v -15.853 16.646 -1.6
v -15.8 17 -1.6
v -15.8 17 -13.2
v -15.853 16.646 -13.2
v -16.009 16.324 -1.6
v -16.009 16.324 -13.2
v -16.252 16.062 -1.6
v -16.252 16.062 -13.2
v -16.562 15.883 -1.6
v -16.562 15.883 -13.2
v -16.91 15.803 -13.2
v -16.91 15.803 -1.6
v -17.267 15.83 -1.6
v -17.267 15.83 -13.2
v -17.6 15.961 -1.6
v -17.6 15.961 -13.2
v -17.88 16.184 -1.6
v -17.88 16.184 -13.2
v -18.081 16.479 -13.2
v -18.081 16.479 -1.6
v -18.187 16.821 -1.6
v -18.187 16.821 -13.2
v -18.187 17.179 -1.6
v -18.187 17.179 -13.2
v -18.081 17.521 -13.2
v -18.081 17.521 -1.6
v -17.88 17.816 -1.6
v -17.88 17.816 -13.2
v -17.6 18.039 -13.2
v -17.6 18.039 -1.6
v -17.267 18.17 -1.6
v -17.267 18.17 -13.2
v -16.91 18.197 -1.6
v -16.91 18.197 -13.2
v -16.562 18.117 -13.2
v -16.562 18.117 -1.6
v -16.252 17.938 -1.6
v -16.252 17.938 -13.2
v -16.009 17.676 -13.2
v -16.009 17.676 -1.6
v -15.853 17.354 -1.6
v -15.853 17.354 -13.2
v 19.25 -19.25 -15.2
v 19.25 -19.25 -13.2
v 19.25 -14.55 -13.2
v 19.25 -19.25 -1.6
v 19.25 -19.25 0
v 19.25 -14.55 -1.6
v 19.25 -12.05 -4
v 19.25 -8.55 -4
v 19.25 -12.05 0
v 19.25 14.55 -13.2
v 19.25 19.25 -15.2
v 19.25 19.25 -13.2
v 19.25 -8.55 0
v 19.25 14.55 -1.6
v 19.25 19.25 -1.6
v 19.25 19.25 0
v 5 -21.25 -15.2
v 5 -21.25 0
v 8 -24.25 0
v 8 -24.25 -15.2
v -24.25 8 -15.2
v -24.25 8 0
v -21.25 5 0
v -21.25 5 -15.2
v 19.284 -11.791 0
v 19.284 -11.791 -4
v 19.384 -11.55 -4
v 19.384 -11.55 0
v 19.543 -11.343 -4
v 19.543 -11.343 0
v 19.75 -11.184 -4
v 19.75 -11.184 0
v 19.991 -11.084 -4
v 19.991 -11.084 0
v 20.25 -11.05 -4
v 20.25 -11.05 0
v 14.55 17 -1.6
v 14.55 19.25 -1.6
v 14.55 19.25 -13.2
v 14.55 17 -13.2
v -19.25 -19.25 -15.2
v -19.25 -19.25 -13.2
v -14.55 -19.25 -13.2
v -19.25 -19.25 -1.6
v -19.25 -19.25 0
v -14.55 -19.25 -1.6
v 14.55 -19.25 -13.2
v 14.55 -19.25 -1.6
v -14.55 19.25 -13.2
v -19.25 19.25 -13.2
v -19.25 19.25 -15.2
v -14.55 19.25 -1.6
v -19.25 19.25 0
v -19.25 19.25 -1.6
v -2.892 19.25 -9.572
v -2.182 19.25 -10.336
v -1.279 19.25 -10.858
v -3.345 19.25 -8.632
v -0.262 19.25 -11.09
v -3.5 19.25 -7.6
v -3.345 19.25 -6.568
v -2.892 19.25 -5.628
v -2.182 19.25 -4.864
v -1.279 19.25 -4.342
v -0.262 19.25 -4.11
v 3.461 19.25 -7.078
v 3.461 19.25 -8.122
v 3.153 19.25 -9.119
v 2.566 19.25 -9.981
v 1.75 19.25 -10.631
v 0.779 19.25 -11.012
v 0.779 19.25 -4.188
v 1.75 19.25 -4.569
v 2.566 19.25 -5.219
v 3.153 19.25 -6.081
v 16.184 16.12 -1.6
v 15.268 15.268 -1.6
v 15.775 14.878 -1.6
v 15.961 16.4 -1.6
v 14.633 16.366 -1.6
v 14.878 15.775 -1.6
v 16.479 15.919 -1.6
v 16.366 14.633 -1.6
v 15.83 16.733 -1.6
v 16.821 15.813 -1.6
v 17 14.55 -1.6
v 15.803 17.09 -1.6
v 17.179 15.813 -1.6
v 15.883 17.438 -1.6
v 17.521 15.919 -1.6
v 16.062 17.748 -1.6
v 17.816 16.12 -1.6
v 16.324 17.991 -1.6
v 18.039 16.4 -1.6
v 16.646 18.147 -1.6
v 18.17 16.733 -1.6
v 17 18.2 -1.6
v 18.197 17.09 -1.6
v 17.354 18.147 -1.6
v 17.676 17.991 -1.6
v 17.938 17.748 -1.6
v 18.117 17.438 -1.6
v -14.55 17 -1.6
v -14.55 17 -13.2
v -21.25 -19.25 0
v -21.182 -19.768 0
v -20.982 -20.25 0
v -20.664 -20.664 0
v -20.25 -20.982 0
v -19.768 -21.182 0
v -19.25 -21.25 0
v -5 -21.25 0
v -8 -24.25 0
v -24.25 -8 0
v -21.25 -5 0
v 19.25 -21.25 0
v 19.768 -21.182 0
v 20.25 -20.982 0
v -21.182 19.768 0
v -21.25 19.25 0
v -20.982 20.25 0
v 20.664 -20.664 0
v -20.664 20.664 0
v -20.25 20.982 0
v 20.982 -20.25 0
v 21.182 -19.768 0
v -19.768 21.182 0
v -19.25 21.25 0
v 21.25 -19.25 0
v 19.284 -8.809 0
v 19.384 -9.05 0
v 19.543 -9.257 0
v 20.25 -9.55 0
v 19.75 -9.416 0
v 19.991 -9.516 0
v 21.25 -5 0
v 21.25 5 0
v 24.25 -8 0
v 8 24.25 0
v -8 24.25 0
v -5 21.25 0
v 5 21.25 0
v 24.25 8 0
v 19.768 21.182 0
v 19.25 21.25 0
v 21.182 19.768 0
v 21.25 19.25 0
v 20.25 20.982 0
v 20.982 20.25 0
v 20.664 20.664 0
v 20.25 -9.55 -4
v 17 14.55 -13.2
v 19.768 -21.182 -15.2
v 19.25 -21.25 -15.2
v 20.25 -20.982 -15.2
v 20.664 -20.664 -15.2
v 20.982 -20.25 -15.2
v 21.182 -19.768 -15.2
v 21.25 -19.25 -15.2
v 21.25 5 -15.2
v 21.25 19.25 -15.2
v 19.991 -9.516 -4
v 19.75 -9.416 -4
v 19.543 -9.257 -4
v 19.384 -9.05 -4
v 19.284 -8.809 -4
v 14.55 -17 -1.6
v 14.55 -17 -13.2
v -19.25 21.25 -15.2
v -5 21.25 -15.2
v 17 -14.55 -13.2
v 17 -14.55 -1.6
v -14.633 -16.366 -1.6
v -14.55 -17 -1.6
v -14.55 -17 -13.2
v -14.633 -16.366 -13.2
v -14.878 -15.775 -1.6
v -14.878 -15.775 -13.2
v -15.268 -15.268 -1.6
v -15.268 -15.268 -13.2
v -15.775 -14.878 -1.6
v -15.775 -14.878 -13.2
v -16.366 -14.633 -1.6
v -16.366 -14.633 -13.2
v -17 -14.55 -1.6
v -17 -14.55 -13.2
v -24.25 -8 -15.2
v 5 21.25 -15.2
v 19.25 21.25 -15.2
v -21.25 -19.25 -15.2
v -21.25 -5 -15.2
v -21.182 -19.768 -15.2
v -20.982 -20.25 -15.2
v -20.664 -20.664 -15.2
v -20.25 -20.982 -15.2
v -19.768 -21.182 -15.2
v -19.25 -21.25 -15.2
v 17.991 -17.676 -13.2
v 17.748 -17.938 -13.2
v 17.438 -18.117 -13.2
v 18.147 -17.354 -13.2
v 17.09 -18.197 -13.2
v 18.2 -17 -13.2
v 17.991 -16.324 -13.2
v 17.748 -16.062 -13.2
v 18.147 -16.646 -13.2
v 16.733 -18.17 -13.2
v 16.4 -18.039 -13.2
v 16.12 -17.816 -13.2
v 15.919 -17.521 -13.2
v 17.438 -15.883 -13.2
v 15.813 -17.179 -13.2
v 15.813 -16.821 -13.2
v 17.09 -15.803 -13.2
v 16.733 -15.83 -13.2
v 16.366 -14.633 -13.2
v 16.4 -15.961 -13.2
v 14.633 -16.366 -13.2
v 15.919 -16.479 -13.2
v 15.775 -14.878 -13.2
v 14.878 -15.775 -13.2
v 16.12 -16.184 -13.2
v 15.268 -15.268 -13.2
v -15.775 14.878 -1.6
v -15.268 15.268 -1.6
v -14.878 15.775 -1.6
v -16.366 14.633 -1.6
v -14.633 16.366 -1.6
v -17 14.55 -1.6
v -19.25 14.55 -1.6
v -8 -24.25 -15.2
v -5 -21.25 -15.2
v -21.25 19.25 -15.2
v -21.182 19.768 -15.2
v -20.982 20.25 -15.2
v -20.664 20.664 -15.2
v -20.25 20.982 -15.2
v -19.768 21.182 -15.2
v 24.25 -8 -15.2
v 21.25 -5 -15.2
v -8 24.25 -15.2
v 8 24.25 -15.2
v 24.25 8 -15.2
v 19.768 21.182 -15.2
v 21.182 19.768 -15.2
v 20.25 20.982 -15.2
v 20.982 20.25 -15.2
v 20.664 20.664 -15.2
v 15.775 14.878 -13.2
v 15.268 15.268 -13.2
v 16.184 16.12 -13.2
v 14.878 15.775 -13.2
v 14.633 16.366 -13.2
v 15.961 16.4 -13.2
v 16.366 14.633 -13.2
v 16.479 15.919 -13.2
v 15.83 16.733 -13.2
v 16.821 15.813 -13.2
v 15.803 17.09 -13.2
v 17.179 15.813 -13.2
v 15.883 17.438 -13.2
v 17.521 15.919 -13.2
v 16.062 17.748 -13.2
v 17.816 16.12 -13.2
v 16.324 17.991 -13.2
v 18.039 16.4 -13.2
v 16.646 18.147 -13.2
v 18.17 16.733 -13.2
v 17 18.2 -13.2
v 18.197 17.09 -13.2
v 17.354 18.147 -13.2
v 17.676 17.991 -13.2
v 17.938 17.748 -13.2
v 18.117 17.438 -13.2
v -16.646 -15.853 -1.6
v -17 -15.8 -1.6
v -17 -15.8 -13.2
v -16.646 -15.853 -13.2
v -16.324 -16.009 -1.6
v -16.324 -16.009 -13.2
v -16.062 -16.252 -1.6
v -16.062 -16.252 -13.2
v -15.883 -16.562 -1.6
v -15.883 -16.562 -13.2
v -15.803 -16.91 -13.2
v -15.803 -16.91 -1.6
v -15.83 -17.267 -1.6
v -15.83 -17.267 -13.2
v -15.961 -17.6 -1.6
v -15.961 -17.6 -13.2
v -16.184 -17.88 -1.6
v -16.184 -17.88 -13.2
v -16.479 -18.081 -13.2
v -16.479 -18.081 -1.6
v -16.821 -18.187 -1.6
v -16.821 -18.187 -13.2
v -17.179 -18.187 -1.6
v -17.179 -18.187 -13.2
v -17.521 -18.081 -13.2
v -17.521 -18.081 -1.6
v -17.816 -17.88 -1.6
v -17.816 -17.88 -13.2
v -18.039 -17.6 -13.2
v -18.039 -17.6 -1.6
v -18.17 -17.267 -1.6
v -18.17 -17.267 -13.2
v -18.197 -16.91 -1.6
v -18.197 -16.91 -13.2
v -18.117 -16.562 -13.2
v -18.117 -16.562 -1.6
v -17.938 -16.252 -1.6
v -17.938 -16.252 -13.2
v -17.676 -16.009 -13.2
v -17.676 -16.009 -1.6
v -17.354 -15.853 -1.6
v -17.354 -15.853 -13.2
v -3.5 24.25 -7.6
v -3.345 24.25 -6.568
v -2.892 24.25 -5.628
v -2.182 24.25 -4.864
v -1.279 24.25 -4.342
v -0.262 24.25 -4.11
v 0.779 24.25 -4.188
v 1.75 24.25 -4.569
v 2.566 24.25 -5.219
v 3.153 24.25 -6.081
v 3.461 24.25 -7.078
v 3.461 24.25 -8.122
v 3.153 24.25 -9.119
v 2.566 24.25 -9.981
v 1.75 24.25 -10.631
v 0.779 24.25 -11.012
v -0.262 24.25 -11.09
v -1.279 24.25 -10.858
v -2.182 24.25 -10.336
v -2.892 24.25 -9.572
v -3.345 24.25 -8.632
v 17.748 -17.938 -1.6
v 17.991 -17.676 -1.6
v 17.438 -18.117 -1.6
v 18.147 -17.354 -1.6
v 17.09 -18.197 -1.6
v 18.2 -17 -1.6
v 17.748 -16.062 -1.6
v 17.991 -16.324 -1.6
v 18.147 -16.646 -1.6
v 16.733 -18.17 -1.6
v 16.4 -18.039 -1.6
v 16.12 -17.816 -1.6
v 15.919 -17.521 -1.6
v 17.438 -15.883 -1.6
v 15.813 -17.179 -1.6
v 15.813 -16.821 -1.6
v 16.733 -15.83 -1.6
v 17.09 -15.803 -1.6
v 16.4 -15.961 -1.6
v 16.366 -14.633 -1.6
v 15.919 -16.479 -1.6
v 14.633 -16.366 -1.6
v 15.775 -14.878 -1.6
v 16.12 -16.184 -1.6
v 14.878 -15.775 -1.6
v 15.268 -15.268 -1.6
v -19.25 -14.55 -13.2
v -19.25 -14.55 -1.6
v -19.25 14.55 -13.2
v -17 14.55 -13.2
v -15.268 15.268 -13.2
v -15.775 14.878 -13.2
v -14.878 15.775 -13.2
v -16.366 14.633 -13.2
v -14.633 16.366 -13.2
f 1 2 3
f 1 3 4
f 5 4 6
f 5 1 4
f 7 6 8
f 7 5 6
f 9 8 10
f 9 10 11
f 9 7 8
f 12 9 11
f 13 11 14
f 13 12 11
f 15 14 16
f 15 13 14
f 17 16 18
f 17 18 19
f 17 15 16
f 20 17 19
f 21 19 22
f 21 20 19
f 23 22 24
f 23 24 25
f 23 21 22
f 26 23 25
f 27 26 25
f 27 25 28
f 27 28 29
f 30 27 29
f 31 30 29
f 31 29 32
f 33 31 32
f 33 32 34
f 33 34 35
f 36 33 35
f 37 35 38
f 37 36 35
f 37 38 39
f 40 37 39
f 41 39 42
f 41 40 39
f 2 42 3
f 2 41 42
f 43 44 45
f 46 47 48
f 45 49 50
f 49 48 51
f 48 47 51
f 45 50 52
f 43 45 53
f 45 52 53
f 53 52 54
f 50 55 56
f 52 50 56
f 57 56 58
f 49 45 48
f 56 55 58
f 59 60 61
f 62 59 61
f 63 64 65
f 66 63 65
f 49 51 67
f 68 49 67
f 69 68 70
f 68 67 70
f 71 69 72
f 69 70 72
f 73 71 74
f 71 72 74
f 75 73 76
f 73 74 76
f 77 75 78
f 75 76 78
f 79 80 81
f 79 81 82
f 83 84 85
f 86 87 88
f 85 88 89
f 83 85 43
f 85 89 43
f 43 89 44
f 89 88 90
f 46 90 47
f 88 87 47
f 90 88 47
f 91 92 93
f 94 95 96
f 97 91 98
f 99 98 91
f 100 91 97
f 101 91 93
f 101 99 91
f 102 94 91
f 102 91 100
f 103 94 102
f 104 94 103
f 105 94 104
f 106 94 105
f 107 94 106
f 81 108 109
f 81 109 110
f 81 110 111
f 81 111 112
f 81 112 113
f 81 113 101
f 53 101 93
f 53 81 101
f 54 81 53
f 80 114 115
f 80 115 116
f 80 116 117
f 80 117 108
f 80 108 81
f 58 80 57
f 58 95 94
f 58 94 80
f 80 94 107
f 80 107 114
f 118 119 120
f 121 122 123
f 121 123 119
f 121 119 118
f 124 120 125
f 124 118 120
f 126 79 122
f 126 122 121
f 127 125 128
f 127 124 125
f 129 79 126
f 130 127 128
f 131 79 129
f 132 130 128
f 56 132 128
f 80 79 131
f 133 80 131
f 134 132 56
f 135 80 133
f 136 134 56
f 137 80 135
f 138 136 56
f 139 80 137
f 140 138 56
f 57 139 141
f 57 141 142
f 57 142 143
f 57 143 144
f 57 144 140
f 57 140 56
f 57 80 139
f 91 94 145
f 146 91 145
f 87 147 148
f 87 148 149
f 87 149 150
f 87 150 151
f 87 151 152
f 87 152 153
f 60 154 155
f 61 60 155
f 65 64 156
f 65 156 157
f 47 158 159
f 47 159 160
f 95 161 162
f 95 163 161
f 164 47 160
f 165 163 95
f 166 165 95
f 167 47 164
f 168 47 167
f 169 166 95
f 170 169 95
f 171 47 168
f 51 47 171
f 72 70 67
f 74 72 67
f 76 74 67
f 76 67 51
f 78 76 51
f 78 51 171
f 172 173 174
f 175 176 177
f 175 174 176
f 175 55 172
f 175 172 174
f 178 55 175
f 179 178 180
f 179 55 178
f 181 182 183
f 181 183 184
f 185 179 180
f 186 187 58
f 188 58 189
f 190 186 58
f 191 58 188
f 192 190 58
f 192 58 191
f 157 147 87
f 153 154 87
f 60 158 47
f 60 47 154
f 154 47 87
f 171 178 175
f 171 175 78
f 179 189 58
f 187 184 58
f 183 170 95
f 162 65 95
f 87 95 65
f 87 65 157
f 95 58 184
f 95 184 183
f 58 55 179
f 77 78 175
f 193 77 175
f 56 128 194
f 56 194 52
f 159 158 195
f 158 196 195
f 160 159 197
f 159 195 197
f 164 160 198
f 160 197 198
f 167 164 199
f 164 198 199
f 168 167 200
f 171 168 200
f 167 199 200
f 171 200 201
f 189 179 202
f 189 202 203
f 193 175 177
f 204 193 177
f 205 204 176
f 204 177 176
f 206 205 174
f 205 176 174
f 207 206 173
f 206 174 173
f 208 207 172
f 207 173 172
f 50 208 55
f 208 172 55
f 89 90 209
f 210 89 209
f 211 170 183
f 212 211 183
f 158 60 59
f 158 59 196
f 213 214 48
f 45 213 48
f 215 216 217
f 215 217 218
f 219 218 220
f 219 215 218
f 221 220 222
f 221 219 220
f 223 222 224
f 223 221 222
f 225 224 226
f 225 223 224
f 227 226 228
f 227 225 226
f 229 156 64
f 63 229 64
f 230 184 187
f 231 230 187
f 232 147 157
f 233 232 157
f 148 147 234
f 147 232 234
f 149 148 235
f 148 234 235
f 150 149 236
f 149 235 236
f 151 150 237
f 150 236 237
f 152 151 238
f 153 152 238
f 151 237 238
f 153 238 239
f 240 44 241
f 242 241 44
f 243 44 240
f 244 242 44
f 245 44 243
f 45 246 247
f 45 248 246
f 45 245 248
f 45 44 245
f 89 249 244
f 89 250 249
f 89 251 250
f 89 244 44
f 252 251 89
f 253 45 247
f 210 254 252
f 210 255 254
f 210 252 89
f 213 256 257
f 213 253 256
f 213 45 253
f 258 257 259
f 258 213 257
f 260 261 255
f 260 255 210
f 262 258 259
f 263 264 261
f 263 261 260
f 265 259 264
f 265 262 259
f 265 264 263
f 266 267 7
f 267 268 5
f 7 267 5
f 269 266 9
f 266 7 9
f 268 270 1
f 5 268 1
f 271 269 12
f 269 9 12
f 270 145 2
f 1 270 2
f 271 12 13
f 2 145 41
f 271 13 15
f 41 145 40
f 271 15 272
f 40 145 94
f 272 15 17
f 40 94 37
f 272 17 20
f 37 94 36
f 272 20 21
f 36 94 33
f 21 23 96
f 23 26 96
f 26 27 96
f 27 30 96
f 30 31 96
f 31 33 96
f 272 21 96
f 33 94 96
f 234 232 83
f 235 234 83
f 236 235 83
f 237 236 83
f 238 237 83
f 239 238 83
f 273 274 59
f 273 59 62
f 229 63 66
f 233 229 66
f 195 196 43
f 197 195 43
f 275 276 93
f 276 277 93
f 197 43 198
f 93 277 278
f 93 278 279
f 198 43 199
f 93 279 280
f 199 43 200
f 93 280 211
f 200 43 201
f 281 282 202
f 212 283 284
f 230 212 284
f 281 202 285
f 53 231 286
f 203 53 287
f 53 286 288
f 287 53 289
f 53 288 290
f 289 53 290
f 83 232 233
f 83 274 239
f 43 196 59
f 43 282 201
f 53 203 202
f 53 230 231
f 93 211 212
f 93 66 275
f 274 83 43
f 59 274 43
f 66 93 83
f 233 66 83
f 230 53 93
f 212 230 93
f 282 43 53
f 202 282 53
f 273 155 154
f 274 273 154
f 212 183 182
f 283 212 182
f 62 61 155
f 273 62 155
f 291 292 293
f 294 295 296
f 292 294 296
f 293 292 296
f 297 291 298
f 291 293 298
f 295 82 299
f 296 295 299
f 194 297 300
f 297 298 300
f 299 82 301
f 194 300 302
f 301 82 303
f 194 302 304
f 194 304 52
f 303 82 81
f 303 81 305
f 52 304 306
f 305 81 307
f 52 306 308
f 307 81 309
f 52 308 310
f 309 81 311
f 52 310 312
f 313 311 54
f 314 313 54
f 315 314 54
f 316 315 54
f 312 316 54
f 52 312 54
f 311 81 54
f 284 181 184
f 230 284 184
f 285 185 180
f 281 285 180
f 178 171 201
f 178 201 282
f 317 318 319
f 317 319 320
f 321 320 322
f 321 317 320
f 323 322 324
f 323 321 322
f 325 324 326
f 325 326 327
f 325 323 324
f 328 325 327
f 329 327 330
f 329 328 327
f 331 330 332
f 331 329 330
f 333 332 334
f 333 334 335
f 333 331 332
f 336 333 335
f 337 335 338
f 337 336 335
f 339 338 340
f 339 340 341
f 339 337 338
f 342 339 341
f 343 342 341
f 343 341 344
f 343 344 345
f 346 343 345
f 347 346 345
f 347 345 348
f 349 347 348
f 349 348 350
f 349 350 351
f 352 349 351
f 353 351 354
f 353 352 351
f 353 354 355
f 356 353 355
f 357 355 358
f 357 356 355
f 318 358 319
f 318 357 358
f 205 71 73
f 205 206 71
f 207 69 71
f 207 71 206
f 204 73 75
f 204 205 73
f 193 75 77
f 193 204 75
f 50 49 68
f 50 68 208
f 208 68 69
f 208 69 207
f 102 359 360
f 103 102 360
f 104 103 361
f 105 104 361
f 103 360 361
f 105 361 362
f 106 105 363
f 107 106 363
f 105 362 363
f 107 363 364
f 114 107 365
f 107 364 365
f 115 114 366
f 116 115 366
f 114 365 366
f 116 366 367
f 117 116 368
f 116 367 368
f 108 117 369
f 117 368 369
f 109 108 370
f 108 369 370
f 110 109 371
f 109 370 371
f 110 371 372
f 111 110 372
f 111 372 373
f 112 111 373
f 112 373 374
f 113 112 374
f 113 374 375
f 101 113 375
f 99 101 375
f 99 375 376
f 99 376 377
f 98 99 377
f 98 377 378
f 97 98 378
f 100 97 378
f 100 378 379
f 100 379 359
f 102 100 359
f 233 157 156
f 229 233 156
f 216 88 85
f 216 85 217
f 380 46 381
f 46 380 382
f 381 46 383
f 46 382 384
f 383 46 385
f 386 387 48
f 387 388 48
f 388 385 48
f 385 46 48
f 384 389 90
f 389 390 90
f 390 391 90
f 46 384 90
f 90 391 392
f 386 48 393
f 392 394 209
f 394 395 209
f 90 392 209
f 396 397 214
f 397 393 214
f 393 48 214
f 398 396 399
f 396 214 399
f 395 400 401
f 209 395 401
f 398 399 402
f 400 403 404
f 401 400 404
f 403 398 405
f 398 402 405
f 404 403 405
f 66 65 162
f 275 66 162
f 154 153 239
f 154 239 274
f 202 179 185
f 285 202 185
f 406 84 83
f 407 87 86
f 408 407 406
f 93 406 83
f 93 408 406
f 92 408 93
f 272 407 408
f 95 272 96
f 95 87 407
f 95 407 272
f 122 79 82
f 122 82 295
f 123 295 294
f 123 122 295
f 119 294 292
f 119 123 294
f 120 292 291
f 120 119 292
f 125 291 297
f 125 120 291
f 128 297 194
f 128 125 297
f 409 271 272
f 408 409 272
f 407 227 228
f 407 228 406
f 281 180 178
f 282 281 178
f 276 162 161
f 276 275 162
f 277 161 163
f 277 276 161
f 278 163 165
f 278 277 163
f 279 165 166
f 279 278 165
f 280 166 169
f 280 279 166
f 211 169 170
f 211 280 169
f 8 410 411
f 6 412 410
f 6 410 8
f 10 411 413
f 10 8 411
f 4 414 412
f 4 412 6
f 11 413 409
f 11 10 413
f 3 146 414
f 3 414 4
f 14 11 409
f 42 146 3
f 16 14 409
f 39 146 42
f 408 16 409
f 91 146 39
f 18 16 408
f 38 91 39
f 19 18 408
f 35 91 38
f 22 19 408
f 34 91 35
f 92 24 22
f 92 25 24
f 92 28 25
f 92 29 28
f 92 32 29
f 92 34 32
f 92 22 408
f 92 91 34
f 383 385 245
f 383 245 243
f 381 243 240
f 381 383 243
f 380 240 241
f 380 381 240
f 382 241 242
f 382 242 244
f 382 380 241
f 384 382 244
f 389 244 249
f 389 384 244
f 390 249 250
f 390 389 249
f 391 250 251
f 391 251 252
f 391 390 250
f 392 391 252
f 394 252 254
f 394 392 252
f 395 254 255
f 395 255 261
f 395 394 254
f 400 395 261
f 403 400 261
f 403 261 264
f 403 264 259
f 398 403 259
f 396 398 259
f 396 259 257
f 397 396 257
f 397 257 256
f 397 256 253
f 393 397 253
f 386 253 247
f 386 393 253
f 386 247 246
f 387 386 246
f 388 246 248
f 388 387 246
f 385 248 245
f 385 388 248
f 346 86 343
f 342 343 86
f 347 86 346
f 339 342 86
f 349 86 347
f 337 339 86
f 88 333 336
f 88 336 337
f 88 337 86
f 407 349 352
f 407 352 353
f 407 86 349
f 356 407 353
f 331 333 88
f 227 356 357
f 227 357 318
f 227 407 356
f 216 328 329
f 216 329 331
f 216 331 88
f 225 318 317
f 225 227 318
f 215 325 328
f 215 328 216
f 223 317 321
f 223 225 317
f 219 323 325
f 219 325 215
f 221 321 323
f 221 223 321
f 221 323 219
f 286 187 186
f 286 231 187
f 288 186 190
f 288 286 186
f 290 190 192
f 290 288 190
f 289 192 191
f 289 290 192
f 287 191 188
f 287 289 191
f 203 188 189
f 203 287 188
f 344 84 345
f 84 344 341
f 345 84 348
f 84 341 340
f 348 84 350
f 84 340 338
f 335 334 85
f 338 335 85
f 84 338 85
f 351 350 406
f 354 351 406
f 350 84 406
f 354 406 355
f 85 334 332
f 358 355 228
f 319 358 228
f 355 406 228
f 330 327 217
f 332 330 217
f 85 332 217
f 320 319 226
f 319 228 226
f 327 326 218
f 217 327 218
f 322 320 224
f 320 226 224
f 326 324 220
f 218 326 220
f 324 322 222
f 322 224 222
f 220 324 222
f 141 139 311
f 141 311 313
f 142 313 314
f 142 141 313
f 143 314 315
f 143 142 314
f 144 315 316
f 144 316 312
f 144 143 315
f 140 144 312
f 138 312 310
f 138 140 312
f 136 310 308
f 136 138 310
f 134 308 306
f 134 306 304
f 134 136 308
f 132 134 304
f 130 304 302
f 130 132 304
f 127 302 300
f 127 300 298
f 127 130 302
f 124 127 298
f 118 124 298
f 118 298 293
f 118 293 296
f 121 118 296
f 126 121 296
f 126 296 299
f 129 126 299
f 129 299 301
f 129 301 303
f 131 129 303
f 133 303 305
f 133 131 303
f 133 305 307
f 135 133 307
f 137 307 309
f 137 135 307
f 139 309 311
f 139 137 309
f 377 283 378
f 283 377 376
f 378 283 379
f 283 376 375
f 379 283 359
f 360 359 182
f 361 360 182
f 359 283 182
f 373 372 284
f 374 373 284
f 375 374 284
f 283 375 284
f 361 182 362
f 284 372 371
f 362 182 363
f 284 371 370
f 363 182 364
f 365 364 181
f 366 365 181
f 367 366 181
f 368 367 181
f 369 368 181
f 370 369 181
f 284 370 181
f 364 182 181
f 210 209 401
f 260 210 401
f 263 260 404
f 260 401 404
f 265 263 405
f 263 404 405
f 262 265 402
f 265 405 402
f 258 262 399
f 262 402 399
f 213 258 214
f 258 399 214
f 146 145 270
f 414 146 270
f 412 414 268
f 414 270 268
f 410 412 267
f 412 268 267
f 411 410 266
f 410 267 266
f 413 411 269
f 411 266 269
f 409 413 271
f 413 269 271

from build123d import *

# Parameters (mm, degrees)
SKETCH1_W           = 42.5
SKETCH1_H           = 42.5
SKETCH1_W_2         = 38.5
SKETCH1_H_2         = 38.5
BOSS_EXTRUDE2_DEPTH = 15.2
SKETCH2_R           = 1.2
BOSS_EXTRUDE4_DEPTH = 11.6
BOSS_EXTRUDE5_DEPTH = 15.2
CIRPATTERN1_COUNT   = 4
CUT_EXTRUDE2_DEPTH  = 4
CUT_EXTRUDE3_REACH  = 58.315
SKETCH4_R           = 3.5
FILLET1_R           = 2


with BuildPart() as part:
    # Sketch1 → Boss-Extrude2 (new body)
    with BuildSketch(Plane.XY):
        Rectangle(SKETCH1_W, SKETCH1_H)
        Rectangle(SKETCH1_W_2, SKETCH1_H_2, mode=Mode.SUBTRACT)
    extrude(amount=-BOSS_EXTRUDE2_DEPTH)

    # Sketch2 → Boss-Extrude4 (add)
    # profile 1 of 4: a face of its own
    with BuildSketch(Plane(origin=(0, 0, -1.6), x_dir=(-1, 0, 0), z_dir=(0, 0, -1))):
        with BuildLine():
            Line((17, -14.55), (19.25, -14.55))
            Line((19.25, -14.55), (19.25, -19.25))
            Line((19.25, -19.25), (14.55, -19.25))
            Line((14.55, -19.25), (14.55, -17))
            ThreePointArc((14.55, -17), (15.267588386, -15.267588386), (17, -14.55))
        make_face()
        with Locations(Location((17, -17, 0), (0, 0, 90))):
            Circle(SKETCH2_R, mode=Mode.SUBTRACT)
    # profile 2 of 4: a face of its own
    with BuildSketch(Plane(origin=(0, 0, -1.6), x_dir=(-1, 0, 0), z_dir=(0, 0, -1))):
        with BuildLine():
            Line((19.25, 14.55), (19.25, 19.25))
            Line((19.25, 19.25), (14.55, 19.25))
            Line((14.55, 19.25), (14.55, 17))
            ThreePointArc((14.55, 17), (15.267588386, 15.267588386), (17, 14.55))
            Line((17, 14.55), (19.25, 14.55))
        make_face()
        with Locations(Location((17, 17, 0), (0, 0, 180))):
            Circle(SKETCH2_R, mode=Mode.SUBTRACT)
    # profile 3 of 4: a face of its own
    with BuildSketch(Plane(origin=(0, 0, -1.6), x_dir=(-1, 0, 0), z_dir=(0, 0, -1))):
        with BuildLine():
            Line((-19.25, -14.55), (-19.25, -19.25))
            Line((-19.25, -19.25), (-14.55, -19.25))
            Line((-14.55, -19.25), (-14.55, -17))
            ThreePointArc((-14.55, -17), (-15.267588386, -15.267588386), (-17, -14.55))
            Line((-17, -14.55), (-19.25, -14.55))
        make_face()
        with Locations(Location((-17, -17, 0), (0, 0, 180))):
            Circle(SKETCH2_R, mode=Mode.SUBTRACT)
    # profile 4 of 4: a face of its own
    with BuildSketch(Plane(origin=(0, 0, -1.6), x_dir=(-1, 0, 0), z_dir=(0, 0, -1))):
        with BuildLine():
            Line((-17, 14.55), (-19.25, 14.55))
            Line((-19.25, 14.55), (-19.25, 19.25))
            Line((-19.25, 19.25), (-14.55, 19.25))
            Line((-14.55, 19.25), (-14.55, 17))
            ThreePointArc((-14.55, 17), (-15.267588386, 15.267588386), (-17, 14.55))
        make_face()
        with Locations(Location((-17, 17, 0), (0, 0, 90))):
            Circle(SKETCH2_R, mode=Mode.SUBTRACT)
    extrude(amount=BOSS_EXTRUDE4_DEPTH)

    # Sketch5 → Boss-Extrude5 (add)
    with BuildSketch(Plane.XY):
        Polygon((-21.25, 5), (-21.25, -5), (-24.25, -8), (-24.25, 8), align=None)
    boss_extrude5 = extrude(amount=-BOSS_EXTRUDE5_DEPTH)

    # CirPattern1: Boss-Extrude5 ×4 about axis
    cirpattern1_axis = Axis((0, 0, 0), (0, 0, 1))
    for i in range(1, CIRPATTERN1_COUNT):
        add(boss_extrude5.rotate(cirpattern1_axis, i * 360 / CIRPATTERN1_COUNT))

    # Sketch3 → Cut-Extrude2 (cut)
    with BuildSketch(Plane.XY):
        with BuildLine():
            Line((20.25, -11.05), (20.25, -9.55))
            ThreePointArc((20.25, -9.55), (19.542893219, -9.257106781), (19.25, -8.55))
            Line((19.25, -8.55), (19.25, -12.05))
            ThreePointArc((19.25, -12.05), (19.542893219, -11.342893219), (20.25, -11.05))
        make_face()
    extrude(amount=-CUT_EXTRUDE2_DEPTH, mode=Mode.SUBTRACT)

    # Sketch4 → Cut-Extrude3 (cut, up to next)
    with BuildSketch(Plane(origin=(0, 24.25, 0), x_dir=(1, 0, 0), z_dir=(0, 1, 0)), mode=Mode.PRIVATE) as cut_extrude3_sk1:
        with Locations(Location((0, 7.6, 0), (0, 0, 180))):
            Circle(SKETCH4_R)
    cut_extrude3_tool1 = extrude(cut_extrude3_sk1.sketch, amount=-CUT_EXTRUDE3_REACH, mode=Mode.PRIVATE) & part.part
    add(cut_extrude3_tool1.solids().sort_by_distance((0, 24.25, -7.6))[0], mode=Mode.SUBTRACT)

    # Fillet1
    fillet1_edges = [part.edges().sort_by_distance(p)[0] for p in [
        (-21.25, -21.25, -7.6),
        (-21.25, 21.25, -7.6),
        (21.25, 21.25, -7.6),
        (21.25, -21.25, -7.6),
    ]]
    fillet(fillet1_edges, radius=FILLET1_R)


solid = part.part
